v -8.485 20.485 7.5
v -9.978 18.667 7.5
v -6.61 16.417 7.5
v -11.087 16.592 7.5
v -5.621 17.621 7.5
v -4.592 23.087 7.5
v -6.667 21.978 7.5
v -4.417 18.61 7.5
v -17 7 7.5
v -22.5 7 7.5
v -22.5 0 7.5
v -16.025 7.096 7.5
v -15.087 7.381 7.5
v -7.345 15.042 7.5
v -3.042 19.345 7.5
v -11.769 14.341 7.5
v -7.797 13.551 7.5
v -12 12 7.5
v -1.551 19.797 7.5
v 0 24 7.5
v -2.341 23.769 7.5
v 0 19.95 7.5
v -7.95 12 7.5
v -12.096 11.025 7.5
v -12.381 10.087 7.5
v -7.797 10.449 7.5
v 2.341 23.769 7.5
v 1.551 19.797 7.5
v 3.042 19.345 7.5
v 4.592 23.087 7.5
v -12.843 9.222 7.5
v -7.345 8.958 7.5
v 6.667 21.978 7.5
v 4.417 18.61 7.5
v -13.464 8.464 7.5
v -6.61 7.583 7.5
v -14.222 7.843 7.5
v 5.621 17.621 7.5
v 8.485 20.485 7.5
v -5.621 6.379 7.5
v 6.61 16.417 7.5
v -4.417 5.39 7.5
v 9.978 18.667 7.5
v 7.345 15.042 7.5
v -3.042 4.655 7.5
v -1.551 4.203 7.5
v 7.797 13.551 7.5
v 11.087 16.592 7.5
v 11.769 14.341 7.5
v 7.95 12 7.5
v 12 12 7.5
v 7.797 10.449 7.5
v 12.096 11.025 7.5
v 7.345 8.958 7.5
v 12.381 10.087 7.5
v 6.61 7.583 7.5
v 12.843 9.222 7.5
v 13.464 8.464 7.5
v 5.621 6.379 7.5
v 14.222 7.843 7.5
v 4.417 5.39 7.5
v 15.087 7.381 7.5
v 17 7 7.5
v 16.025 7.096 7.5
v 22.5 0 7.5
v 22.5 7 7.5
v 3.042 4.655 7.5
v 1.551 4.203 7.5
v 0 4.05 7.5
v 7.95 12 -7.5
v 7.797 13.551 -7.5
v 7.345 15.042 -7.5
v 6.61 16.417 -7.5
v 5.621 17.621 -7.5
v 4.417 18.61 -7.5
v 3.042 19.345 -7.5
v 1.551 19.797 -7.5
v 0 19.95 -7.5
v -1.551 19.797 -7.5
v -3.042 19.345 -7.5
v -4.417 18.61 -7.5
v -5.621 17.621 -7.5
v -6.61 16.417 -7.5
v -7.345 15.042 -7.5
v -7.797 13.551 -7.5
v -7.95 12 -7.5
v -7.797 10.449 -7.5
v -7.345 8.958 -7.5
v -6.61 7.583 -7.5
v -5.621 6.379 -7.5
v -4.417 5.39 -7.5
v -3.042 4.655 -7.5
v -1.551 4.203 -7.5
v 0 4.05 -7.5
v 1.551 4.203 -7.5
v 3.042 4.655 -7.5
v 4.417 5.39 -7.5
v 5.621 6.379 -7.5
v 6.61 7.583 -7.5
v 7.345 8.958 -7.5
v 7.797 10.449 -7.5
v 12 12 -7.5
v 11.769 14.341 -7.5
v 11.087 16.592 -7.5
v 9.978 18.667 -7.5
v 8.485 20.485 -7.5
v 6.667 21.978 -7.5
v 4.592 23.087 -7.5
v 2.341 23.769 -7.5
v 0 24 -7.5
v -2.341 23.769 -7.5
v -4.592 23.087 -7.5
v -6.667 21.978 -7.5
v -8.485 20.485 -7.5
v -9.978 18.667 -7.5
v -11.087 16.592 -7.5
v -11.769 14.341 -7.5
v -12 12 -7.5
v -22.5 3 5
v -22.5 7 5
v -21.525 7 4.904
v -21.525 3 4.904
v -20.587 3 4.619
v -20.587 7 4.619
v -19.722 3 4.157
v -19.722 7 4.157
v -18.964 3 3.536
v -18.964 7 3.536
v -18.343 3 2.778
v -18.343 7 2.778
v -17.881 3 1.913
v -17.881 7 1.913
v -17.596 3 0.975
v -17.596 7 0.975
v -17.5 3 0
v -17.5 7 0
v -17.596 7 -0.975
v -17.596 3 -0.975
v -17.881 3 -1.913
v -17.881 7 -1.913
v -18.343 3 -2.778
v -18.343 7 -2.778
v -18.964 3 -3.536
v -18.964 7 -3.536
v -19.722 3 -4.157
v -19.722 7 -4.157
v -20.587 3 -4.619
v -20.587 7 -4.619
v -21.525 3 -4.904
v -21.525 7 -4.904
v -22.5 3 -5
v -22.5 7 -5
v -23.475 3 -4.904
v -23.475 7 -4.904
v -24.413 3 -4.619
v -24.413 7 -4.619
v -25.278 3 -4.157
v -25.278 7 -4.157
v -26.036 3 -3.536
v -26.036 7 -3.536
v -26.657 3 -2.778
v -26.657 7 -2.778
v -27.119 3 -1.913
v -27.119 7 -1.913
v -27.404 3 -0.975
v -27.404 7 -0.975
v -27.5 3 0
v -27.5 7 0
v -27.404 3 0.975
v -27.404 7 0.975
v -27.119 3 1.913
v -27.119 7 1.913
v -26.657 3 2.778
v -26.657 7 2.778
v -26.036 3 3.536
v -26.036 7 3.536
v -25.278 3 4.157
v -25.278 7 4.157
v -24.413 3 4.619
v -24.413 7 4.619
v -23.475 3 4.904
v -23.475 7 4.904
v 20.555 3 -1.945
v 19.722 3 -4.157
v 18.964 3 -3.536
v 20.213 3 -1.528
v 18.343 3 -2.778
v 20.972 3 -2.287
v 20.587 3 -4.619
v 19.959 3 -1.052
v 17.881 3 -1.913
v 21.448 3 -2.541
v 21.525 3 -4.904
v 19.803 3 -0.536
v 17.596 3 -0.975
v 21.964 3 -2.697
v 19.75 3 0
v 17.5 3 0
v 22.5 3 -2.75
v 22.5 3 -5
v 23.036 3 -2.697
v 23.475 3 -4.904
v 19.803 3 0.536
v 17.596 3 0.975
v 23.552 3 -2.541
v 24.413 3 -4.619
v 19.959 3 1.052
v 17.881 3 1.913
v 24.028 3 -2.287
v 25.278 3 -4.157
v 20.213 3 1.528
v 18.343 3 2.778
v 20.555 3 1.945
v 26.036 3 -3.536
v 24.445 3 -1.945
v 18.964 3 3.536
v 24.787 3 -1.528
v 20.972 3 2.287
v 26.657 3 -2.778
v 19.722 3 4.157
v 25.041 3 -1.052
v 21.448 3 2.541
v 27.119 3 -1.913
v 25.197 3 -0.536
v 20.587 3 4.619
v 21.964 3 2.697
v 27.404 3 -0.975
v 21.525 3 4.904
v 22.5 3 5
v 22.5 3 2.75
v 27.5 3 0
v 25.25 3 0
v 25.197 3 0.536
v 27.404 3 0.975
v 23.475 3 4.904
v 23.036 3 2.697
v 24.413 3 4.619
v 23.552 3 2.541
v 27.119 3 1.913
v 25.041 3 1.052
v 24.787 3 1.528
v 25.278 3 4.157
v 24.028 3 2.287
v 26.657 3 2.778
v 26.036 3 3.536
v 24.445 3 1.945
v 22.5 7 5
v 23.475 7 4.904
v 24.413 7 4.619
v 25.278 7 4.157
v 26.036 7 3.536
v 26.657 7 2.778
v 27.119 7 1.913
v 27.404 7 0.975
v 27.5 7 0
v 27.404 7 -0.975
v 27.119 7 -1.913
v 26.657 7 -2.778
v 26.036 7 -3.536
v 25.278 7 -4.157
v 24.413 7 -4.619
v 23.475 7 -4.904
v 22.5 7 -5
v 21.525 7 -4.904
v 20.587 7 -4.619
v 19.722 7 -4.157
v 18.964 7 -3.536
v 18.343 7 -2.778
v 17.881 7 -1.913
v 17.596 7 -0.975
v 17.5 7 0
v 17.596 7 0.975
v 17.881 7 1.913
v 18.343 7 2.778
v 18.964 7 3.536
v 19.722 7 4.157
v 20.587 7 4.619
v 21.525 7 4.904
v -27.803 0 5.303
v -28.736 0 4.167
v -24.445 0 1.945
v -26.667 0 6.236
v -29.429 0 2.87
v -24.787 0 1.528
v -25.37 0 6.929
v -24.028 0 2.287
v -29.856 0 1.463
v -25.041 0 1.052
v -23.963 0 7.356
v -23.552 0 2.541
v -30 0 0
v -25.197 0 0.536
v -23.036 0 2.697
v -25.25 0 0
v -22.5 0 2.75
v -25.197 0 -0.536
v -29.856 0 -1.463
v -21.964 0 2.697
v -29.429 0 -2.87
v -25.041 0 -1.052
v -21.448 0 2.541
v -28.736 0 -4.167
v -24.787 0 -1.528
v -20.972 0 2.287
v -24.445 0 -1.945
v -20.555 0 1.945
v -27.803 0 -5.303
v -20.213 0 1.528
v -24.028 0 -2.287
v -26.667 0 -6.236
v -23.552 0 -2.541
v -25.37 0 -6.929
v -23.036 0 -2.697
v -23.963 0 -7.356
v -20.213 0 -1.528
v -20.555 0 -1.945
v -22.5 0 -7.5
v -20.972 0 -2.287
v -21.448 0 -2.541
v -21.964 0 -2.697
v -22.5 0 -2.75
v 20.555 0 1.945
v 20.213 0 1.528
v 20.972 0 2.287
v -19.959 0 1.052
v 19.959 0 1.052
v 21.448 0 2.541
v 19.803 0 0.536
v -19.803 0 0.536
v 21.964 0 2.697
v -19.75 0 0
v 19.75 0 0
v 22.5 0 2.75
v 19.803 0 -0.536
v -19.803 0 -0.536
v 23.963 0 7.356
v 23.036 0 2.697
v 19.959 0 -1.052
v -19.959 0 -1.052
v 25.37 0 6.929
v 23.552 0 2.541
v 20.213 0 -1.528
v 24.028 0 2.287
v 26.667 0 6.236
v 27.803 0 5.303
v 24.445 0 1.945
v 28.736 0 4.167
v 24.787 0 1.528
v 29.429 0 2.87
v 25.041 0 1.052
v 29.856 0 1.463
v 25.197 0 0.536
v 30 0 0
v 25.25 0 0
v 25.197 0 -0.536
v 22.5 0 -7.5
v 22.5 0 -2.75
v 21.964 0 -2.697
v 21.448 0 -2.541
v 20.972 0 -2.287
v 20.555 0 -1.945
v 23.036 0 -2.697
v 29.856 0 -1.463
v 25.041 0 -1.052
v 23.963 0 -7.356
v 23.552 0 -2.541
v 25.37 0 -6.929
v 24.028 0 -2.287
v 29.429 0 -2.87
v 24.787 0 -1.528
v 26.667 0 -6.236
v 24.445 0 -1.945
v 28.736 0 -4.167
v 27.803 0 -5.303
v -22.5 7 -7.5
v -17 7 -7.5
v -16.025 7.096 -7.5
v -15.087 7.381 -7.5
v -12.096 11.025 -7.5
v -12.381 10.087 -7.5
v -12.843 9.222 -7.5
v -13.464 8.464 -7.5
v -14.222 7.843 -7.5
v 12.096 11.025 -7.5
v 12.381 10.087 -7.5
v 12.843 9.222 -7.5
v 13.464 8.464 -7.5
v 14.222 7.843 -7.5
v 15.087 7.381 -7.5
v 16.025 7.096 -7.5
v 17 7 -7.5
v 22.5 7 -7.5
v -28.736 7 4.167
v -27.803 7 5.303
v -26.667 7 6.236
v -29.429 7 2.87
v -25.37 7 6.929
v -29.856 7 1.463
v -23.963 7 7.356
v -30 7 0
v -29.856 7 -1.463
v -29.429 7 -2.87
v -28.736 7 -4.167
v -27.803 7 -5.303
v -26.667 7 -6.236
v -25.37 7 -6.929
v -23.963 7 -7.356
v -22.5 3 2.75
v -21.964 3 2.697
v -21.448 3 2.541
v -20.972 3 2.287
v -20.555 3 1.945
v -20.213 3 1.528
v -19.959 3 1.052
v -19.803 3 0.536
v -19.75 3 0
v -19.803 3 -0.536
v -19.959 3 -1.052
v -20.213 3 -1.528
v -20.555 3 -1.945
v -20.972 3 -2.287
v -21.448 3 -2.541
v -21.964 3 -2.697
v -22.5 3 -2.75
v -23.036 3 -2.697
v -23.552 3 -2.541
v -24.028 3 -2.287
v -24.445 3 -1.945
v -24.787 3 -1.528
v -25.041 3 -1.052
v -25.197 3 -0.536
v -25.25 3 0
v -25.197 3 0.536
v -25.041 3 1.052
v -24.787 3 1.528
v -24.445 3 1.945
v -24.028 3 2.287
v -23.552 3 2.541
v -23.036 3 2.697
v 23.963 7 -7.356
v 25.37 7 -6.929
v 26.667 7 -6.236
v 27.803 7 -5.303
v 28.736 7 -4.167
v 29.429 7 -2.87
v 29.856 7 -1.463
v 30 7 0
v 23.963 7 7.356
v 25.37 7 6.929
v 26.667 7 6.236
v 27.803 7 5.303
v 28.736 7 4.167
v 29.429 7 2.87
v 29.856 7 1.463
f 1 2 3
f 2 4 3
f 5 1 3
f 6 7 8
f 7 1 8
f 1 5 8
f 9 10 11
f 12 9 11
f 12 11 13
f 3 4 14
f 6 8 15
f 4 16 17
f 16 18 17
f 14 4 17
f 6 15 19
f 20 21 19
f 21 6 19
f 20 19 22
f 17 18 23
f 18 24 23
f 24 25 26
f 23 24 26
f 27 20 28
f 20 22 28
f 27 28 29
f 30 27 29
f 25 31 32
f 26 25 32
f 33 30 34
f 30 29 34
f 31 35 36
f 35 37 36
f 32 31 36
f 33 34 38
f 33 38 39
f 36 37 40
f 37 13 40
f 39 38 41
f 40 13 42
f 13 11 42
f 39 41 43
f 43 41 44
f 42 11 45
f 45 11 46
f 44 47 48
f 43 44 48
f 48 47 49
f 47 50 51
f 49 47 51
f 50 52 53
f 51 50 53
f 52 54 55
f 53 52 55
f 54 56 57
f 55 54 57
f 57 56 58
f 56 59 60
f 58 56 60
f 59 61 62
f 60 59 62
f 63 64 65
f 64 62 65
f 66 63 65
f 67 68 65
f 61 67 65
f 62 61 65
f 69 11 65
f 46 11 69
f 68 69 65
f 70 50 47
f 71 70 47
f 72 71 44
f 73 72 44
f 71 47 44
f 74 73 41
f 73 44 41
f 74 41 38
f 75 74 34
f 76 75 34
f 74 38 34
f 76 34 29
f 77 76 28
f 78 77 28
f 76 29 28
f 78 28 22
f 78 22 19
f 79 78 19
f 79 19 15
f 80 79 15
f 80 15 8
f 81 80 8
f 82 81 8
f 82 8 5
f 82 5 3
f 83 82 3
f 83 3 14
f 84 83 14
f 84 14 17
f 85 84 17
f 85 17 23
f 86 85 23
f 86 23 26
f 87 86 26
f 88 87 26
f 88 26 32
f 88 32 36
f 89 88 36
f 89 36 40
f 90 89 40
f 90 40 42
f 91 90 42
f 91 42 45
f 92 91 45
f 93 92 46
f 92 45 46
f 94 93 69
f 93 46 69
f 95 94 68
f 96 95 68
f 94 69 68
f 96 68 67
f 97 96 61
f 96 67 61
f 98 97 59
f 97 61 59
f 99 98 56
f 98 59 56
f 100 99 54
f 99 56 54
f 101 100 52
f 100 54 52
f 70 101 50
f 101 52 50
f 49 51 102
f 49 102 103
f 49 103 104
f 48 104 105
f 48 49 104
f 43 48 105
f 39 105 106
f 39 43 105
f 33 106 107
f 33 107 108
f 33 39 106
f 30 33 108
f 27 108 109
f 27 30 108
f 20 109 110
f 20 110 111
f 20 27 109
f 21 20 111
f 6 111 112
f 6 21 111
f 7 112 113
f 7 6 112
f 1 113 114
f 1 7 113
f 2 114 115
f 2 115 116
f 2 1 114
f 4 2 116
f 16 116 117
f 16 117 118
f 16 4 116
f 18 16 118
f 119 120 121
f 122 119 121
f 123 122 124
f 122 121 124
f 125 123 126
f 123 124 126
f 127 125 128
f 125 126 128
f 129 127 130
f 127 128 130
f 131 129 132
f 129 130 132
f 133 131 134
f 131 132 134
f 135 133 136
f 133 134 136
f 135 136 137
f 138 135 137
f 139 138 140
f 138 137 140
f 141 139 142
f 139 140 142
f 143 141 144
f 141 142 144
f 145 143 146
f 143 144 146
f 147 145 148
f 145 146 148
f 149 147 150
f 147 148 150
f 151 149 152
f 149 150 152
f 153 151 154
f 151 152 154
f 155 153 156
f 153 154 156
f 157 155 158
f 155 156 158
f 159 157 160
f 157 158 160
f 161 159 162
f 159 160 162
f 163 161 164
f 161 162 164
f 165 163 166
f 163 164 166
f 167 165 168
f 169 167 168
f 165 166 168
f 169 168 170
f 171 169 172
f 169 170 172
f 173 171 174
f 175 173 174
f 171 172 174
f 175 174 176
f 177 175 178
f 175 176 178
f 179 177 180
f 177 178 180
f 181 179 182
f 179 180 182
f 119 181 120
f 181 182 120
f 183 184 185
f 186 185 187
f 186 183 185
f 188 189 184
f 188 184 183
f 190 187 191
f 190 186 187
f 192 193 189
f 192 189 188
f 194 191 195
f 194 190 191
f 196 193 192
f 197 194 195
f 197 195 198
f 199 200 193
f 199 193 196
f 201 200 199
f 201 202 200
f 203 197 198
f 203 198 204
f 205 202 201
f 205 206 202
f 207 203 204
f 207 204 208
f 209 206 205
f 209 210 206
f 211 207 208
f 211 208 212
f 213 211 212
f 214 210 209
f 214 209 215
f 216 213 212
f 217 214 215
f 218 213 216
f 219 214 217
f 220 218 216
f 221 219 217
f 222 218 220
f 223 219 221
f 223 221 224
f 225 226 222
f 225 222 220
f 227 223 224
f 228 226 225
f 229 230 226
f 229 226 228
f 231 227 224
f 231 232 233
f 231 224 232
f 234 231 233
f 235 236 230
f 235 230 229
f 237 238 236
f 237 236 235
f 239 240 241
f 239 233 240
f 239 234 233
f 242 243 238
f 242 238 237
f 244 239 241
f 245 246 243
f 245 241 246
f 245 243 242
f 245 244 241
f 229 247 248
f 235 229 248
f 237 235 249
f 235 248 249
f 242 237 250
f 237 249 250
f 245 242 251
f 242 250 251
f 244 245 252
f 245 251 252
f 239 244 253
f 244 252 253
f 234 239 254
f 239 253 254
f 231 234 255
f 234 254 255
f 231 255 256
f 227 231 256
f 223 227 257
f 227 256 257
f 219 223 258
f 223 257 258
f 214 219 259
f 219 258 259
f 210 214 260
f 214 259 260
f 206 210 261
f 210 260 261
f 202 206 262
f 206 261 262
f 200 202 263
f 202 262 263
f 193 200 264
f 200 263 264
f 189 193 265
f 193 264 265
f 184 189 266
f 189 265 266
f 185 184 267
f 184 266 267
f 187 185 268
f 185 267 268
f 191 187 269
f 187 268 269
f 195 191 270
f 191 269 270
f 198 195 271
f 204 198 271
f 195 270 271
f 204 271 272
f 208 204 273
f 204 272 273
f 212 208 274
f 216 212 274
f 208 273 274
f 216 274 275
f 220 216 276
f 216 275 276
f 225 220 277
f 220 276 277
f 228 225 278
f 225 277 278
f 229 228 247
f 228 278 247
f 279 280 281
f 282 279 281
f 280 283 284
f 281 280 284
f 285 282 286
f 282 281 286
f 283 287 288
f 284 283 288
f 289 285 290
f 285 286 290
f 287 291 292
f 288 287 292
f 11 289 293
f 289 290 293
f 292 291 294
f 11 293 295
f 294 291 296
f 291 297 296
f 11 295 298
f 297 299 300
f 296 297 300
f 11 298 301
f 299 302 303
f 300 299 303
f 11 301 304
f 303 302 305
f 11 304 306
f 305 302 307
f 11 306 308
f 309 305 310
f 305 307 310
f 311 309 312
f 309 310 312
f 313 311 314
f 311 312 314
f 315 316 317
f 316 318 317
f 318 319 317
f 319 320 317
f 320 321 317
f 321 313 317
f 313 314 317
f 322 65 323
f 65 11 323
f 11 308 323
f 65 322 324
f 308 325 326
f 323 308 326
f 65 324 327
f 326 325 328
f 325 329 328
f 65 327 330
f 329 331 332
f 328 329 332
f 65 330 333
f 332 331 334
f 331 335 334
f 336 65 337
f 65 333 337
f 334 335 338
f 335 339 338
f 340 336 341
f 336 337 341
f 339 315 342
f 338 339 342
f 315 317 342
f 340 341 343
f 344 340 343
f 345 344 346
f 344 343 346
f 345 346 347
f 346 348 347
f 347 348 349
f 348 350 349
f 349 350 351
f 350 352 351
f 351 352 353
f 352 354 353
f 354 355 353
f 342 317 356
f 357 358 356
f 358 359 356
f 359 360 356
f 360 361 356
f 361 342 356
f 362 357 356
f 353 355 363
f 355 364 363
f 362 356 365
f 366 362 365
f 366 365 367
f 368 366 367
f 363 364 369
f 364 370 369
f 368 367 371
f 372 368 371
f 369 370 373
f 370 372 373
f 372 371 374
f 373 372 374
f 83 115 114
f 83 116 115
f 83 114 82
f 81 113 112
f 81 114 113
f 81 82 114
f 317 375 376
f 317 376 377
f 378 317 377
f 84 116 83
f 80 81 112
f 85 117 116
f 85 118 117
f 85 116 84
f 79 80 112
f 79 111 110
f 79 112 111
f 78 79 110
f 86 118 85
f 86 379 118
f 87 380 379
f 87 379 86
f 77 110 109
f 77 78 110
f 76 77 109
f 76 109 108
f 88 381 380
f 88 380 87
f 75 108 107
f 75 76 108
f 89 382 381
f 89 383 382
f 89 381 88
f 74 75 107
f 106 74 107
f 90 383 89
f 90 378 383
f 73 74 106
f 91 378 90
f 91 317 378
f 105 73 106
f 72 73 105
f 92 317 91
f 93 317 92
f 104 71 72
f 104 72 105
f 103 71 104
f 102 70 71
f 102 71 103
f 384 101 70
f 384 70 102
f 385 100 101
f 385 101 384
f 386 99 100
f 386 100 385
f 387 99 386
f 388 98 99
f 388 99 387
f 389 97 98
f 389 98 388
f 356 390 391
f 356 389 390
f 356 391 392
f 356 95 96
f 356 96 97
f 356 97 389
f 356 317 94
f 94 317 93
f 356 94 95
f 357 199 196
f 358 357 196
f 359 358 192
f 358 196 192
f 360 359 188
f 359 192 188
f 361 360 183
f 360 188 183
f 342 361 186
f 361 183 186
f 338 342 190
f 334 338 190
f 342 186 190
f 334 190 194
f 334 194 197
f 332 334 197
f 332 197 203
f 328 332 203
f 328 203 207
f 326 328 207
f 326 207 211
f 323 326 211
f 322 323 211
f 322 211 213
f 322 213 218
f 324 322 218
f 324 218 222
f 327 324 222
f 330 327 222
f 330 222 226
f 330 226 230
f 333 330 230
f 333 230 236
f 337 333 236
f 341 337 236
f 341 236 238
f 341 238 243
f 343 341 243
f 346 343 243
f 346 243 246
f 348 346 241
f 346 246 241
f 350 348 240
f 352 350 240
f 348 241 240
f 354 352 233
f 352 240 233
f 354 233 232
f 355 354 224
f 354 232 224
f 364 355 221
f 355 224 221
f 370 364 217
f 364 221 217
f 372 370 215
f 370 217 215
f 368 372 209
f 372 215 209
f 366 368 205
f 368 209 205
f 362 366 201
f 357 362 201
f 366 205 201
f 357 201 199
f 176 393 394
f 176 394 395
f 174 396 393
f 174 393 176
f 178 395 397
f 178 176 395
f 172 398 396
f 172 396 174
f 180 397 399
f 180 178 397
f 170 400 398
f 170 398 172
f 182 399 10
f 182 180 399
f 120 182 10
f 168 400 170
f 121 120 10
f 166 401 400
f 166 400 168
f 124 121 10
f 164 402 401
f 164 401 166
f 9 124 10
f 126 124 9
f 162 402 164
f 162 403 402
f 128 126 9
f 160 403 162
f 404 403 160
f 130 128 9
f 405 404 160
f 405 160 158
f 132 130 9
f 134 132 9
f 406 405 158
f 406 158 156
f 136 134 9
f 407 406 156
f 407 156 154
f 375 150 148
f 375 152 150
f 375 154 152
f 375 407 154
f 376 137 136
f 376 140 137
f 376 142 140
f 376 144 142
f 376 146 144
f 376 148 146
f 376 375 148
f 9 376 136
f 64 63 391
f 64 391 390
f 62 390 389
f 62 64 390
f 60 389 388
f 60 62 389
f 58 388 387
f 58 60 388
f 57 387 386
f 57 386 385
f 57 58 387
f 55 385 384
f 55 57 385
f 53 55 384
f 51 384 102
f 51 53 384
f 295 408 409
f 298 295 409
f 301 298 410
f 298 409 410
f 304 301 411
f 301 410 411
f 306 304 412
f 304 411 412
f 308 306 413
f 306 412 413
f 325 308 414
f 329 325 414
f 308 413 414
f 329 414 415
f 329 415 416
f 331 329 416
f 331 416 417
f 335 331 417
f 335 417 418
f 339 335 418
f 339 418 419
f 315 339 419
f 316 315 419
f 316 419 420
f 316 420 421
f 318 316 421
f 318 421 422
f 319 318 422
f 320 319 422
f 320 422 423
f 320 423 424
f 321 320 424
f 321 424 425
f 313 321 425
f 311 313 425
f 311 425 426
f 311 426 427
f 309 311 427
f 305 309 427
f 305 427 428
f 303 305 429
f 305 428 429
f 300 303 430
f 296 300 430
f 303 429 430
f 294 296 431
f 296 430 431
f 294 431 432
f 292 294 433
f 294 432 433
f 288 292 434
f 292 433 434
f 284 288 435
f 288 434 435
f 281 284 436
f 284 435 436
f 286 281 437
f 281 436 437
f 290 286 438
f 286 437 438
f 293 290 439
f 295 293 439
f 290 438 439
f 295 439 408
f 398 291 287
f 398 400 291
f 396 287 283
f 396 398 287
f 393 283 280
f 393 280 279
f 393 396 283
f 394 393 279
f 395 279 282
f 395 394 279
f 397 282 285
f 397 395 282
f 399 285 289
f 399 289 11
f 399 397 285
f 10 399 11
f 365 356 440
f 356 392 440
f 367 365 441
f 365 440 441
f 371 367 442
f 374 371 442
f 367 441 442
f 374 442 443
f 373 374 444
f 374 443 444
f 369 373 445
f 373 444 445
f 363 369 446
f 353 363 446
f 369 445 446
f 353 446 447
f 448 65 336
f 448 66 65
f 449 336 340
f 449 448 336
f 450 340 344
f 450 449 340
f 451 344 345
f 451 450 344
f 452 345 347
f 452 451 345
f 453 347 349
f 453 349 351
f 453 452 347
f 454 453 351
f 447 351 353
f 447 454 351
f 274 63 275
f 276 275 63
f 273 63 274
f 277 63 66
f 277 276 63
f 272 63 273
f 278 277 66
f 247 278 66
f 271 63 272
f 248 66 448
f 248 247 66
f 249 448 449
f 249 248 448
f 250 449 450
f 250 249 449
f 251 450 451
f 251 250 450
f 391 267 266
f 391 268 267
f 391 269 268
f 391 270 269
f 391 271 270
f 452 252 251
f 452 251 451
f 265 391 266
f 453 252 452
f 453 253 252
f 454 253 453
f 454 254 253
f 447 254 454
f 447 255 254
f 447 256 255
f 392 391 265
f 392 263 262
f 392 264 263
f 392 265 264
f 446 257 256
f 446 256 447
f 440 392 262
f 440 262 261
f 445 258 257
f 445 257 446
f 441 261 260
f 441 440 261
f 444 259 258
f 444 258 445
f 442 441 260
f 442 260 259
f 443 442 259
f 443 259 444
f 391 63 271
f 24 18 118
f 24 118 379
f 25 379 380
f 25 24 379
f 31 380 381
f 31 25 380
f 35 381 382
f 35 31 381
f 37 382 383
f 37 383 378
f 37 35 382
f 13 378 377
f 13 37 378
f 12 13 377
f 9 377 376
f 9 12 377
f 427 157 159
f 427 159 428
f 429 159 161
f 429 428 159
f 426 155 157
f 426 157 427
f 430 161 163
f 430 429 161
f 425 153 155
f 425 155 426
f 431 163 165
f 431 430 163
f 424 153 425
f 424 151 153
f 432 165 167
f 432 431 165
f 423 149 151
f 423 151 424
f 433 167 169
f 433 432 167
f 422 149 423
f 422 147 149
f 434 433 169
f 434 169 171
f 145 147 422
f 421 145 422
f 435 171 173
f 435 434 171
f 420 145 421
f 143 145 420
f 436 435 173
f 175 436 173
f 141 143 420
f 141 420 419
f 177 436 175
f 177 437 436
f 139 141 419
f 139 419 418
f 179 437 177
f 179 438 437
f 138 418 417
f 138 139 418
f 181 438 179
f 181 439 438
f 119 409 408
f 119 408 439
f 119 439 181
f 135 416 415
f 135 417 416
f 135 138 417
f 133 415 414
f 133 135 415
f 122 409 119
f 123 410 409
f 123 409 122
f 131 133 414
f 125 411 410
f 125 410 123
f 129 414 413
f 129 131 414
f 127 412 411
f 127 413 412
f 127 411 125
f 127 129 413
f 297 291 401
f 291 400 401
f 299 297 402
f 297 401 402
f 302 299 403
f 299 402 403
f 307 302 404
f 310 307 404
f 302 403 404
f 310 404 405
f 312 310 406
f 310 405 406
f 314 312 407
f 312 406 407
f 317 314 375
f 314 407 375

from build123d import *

# Parameters (mm, degrees)
SKETCH1_W           = 60
SKETCH1_H           = 15
BOSS_EXTRUDE1_DEPTH = 7
SKETCH2_R           = 2.75
CUT_EXTRUDE1_DEPTH  = 32.705677725
SKETCH3_R           = 5
CUT_EXTRUDE2_DEPTH  = 4
BOSS_EXTRUDE2_DEPTH = 15
SKETCH5_R           = 7.95
CUT_EXTRUDE3_DEPTH  = 42.243181255
FILLET2_R           = 7.5


with BuildPart() as part:
    # Sketch1 → Boss-Extrude1 (new body)
    with BuildSketch(Plane(origin=(0, 0, 0), x_dir=(1, 0, 0), z_dir=(0, 1, 0))):
        Rectangle(SKETCH1_W, SKETCH1_H)
    extrude(amount=BOSS_EXTRUDE1_DEPTH)

    # Sketch2 → Cut-Extrude1 (cut, through all)
    with BuildSketch(Plane(origin=(0, 7, 0), x_dir=(1, 0, 0), z_dir=(0, 1, 0))):
        with Locations(Location((-22.5, 0, 0), (0, 0, 270))):
            Circle(SKETCH2_R)
        with Locations(Location((22.5, 0, 0), (0, 0, 90))):
            Circle(SKETCH2_R)
    extrude(amount=-CUT_EXTRUDE1_DEPTH, mode=Mode.SUBTRACT)

    # Sketch3 → Cut-Extrude2 (cut)
    with BuildSketch(Plane(origin=(0, 7, 0), x_dir=(1, 0, 0), z_dir=(0, 1, 0))):
        with Locations(Location((-22.5, 0, 0), (0, 0, 270))):
            Circle(SKETCH3_R)
        with Locations(Location((22.5, 0, 0), (0, 0, 270))):
            Circle(SKETCH3_R)
    extrude(amount=-CUT_EXTRUDE2_DEPTH, mode=Mode.SUBTRACT)

    # Sketch4 → Boss-Extrude2 (add)
    with BuildSketch(Plane.XY.offset(7.5)):
        with BuildLine():
            Line((-17, 7), (17, 7))
            ThreePointArc((17, 7), (13.464466094, 8.464466094), (12, 12))
            ThreePointArc((12, 12), (0, 24), (-12, 12))
            ThreePointArc((-12, 12), (-13.464466094, 8.464466094), (-17, 7))
        make_face()
    extrude(amount=-BOSS_EXTRUDE2_DEPTH)

    # Sketch5 → Cut-Extrude3 (cut, through all)
    with BuildSketch(Plane.XY.offset(7.5)):
        with Locations((0, 12)):
            Circle(SKETCH5_R)
    extrude(amount=-CUT_EXTRUDE3_DEPTH, mode=Mode.SUBTRACT)

    # Fillet2
    fillet2_edges = [part.edges().sort_by_distance(p)[0] for p in [
        (30, 3.5, 7.5),
        (30, 3.5, -7.5),
        (-30, 3.5, -7.5),
        (-30, 3.5, 7.5),
    ]]
    fillet(fillet2_edges, radius=FILLET2_R - 0.0001)  # a hair under: the kernel refuses the full size


solid = part.part
